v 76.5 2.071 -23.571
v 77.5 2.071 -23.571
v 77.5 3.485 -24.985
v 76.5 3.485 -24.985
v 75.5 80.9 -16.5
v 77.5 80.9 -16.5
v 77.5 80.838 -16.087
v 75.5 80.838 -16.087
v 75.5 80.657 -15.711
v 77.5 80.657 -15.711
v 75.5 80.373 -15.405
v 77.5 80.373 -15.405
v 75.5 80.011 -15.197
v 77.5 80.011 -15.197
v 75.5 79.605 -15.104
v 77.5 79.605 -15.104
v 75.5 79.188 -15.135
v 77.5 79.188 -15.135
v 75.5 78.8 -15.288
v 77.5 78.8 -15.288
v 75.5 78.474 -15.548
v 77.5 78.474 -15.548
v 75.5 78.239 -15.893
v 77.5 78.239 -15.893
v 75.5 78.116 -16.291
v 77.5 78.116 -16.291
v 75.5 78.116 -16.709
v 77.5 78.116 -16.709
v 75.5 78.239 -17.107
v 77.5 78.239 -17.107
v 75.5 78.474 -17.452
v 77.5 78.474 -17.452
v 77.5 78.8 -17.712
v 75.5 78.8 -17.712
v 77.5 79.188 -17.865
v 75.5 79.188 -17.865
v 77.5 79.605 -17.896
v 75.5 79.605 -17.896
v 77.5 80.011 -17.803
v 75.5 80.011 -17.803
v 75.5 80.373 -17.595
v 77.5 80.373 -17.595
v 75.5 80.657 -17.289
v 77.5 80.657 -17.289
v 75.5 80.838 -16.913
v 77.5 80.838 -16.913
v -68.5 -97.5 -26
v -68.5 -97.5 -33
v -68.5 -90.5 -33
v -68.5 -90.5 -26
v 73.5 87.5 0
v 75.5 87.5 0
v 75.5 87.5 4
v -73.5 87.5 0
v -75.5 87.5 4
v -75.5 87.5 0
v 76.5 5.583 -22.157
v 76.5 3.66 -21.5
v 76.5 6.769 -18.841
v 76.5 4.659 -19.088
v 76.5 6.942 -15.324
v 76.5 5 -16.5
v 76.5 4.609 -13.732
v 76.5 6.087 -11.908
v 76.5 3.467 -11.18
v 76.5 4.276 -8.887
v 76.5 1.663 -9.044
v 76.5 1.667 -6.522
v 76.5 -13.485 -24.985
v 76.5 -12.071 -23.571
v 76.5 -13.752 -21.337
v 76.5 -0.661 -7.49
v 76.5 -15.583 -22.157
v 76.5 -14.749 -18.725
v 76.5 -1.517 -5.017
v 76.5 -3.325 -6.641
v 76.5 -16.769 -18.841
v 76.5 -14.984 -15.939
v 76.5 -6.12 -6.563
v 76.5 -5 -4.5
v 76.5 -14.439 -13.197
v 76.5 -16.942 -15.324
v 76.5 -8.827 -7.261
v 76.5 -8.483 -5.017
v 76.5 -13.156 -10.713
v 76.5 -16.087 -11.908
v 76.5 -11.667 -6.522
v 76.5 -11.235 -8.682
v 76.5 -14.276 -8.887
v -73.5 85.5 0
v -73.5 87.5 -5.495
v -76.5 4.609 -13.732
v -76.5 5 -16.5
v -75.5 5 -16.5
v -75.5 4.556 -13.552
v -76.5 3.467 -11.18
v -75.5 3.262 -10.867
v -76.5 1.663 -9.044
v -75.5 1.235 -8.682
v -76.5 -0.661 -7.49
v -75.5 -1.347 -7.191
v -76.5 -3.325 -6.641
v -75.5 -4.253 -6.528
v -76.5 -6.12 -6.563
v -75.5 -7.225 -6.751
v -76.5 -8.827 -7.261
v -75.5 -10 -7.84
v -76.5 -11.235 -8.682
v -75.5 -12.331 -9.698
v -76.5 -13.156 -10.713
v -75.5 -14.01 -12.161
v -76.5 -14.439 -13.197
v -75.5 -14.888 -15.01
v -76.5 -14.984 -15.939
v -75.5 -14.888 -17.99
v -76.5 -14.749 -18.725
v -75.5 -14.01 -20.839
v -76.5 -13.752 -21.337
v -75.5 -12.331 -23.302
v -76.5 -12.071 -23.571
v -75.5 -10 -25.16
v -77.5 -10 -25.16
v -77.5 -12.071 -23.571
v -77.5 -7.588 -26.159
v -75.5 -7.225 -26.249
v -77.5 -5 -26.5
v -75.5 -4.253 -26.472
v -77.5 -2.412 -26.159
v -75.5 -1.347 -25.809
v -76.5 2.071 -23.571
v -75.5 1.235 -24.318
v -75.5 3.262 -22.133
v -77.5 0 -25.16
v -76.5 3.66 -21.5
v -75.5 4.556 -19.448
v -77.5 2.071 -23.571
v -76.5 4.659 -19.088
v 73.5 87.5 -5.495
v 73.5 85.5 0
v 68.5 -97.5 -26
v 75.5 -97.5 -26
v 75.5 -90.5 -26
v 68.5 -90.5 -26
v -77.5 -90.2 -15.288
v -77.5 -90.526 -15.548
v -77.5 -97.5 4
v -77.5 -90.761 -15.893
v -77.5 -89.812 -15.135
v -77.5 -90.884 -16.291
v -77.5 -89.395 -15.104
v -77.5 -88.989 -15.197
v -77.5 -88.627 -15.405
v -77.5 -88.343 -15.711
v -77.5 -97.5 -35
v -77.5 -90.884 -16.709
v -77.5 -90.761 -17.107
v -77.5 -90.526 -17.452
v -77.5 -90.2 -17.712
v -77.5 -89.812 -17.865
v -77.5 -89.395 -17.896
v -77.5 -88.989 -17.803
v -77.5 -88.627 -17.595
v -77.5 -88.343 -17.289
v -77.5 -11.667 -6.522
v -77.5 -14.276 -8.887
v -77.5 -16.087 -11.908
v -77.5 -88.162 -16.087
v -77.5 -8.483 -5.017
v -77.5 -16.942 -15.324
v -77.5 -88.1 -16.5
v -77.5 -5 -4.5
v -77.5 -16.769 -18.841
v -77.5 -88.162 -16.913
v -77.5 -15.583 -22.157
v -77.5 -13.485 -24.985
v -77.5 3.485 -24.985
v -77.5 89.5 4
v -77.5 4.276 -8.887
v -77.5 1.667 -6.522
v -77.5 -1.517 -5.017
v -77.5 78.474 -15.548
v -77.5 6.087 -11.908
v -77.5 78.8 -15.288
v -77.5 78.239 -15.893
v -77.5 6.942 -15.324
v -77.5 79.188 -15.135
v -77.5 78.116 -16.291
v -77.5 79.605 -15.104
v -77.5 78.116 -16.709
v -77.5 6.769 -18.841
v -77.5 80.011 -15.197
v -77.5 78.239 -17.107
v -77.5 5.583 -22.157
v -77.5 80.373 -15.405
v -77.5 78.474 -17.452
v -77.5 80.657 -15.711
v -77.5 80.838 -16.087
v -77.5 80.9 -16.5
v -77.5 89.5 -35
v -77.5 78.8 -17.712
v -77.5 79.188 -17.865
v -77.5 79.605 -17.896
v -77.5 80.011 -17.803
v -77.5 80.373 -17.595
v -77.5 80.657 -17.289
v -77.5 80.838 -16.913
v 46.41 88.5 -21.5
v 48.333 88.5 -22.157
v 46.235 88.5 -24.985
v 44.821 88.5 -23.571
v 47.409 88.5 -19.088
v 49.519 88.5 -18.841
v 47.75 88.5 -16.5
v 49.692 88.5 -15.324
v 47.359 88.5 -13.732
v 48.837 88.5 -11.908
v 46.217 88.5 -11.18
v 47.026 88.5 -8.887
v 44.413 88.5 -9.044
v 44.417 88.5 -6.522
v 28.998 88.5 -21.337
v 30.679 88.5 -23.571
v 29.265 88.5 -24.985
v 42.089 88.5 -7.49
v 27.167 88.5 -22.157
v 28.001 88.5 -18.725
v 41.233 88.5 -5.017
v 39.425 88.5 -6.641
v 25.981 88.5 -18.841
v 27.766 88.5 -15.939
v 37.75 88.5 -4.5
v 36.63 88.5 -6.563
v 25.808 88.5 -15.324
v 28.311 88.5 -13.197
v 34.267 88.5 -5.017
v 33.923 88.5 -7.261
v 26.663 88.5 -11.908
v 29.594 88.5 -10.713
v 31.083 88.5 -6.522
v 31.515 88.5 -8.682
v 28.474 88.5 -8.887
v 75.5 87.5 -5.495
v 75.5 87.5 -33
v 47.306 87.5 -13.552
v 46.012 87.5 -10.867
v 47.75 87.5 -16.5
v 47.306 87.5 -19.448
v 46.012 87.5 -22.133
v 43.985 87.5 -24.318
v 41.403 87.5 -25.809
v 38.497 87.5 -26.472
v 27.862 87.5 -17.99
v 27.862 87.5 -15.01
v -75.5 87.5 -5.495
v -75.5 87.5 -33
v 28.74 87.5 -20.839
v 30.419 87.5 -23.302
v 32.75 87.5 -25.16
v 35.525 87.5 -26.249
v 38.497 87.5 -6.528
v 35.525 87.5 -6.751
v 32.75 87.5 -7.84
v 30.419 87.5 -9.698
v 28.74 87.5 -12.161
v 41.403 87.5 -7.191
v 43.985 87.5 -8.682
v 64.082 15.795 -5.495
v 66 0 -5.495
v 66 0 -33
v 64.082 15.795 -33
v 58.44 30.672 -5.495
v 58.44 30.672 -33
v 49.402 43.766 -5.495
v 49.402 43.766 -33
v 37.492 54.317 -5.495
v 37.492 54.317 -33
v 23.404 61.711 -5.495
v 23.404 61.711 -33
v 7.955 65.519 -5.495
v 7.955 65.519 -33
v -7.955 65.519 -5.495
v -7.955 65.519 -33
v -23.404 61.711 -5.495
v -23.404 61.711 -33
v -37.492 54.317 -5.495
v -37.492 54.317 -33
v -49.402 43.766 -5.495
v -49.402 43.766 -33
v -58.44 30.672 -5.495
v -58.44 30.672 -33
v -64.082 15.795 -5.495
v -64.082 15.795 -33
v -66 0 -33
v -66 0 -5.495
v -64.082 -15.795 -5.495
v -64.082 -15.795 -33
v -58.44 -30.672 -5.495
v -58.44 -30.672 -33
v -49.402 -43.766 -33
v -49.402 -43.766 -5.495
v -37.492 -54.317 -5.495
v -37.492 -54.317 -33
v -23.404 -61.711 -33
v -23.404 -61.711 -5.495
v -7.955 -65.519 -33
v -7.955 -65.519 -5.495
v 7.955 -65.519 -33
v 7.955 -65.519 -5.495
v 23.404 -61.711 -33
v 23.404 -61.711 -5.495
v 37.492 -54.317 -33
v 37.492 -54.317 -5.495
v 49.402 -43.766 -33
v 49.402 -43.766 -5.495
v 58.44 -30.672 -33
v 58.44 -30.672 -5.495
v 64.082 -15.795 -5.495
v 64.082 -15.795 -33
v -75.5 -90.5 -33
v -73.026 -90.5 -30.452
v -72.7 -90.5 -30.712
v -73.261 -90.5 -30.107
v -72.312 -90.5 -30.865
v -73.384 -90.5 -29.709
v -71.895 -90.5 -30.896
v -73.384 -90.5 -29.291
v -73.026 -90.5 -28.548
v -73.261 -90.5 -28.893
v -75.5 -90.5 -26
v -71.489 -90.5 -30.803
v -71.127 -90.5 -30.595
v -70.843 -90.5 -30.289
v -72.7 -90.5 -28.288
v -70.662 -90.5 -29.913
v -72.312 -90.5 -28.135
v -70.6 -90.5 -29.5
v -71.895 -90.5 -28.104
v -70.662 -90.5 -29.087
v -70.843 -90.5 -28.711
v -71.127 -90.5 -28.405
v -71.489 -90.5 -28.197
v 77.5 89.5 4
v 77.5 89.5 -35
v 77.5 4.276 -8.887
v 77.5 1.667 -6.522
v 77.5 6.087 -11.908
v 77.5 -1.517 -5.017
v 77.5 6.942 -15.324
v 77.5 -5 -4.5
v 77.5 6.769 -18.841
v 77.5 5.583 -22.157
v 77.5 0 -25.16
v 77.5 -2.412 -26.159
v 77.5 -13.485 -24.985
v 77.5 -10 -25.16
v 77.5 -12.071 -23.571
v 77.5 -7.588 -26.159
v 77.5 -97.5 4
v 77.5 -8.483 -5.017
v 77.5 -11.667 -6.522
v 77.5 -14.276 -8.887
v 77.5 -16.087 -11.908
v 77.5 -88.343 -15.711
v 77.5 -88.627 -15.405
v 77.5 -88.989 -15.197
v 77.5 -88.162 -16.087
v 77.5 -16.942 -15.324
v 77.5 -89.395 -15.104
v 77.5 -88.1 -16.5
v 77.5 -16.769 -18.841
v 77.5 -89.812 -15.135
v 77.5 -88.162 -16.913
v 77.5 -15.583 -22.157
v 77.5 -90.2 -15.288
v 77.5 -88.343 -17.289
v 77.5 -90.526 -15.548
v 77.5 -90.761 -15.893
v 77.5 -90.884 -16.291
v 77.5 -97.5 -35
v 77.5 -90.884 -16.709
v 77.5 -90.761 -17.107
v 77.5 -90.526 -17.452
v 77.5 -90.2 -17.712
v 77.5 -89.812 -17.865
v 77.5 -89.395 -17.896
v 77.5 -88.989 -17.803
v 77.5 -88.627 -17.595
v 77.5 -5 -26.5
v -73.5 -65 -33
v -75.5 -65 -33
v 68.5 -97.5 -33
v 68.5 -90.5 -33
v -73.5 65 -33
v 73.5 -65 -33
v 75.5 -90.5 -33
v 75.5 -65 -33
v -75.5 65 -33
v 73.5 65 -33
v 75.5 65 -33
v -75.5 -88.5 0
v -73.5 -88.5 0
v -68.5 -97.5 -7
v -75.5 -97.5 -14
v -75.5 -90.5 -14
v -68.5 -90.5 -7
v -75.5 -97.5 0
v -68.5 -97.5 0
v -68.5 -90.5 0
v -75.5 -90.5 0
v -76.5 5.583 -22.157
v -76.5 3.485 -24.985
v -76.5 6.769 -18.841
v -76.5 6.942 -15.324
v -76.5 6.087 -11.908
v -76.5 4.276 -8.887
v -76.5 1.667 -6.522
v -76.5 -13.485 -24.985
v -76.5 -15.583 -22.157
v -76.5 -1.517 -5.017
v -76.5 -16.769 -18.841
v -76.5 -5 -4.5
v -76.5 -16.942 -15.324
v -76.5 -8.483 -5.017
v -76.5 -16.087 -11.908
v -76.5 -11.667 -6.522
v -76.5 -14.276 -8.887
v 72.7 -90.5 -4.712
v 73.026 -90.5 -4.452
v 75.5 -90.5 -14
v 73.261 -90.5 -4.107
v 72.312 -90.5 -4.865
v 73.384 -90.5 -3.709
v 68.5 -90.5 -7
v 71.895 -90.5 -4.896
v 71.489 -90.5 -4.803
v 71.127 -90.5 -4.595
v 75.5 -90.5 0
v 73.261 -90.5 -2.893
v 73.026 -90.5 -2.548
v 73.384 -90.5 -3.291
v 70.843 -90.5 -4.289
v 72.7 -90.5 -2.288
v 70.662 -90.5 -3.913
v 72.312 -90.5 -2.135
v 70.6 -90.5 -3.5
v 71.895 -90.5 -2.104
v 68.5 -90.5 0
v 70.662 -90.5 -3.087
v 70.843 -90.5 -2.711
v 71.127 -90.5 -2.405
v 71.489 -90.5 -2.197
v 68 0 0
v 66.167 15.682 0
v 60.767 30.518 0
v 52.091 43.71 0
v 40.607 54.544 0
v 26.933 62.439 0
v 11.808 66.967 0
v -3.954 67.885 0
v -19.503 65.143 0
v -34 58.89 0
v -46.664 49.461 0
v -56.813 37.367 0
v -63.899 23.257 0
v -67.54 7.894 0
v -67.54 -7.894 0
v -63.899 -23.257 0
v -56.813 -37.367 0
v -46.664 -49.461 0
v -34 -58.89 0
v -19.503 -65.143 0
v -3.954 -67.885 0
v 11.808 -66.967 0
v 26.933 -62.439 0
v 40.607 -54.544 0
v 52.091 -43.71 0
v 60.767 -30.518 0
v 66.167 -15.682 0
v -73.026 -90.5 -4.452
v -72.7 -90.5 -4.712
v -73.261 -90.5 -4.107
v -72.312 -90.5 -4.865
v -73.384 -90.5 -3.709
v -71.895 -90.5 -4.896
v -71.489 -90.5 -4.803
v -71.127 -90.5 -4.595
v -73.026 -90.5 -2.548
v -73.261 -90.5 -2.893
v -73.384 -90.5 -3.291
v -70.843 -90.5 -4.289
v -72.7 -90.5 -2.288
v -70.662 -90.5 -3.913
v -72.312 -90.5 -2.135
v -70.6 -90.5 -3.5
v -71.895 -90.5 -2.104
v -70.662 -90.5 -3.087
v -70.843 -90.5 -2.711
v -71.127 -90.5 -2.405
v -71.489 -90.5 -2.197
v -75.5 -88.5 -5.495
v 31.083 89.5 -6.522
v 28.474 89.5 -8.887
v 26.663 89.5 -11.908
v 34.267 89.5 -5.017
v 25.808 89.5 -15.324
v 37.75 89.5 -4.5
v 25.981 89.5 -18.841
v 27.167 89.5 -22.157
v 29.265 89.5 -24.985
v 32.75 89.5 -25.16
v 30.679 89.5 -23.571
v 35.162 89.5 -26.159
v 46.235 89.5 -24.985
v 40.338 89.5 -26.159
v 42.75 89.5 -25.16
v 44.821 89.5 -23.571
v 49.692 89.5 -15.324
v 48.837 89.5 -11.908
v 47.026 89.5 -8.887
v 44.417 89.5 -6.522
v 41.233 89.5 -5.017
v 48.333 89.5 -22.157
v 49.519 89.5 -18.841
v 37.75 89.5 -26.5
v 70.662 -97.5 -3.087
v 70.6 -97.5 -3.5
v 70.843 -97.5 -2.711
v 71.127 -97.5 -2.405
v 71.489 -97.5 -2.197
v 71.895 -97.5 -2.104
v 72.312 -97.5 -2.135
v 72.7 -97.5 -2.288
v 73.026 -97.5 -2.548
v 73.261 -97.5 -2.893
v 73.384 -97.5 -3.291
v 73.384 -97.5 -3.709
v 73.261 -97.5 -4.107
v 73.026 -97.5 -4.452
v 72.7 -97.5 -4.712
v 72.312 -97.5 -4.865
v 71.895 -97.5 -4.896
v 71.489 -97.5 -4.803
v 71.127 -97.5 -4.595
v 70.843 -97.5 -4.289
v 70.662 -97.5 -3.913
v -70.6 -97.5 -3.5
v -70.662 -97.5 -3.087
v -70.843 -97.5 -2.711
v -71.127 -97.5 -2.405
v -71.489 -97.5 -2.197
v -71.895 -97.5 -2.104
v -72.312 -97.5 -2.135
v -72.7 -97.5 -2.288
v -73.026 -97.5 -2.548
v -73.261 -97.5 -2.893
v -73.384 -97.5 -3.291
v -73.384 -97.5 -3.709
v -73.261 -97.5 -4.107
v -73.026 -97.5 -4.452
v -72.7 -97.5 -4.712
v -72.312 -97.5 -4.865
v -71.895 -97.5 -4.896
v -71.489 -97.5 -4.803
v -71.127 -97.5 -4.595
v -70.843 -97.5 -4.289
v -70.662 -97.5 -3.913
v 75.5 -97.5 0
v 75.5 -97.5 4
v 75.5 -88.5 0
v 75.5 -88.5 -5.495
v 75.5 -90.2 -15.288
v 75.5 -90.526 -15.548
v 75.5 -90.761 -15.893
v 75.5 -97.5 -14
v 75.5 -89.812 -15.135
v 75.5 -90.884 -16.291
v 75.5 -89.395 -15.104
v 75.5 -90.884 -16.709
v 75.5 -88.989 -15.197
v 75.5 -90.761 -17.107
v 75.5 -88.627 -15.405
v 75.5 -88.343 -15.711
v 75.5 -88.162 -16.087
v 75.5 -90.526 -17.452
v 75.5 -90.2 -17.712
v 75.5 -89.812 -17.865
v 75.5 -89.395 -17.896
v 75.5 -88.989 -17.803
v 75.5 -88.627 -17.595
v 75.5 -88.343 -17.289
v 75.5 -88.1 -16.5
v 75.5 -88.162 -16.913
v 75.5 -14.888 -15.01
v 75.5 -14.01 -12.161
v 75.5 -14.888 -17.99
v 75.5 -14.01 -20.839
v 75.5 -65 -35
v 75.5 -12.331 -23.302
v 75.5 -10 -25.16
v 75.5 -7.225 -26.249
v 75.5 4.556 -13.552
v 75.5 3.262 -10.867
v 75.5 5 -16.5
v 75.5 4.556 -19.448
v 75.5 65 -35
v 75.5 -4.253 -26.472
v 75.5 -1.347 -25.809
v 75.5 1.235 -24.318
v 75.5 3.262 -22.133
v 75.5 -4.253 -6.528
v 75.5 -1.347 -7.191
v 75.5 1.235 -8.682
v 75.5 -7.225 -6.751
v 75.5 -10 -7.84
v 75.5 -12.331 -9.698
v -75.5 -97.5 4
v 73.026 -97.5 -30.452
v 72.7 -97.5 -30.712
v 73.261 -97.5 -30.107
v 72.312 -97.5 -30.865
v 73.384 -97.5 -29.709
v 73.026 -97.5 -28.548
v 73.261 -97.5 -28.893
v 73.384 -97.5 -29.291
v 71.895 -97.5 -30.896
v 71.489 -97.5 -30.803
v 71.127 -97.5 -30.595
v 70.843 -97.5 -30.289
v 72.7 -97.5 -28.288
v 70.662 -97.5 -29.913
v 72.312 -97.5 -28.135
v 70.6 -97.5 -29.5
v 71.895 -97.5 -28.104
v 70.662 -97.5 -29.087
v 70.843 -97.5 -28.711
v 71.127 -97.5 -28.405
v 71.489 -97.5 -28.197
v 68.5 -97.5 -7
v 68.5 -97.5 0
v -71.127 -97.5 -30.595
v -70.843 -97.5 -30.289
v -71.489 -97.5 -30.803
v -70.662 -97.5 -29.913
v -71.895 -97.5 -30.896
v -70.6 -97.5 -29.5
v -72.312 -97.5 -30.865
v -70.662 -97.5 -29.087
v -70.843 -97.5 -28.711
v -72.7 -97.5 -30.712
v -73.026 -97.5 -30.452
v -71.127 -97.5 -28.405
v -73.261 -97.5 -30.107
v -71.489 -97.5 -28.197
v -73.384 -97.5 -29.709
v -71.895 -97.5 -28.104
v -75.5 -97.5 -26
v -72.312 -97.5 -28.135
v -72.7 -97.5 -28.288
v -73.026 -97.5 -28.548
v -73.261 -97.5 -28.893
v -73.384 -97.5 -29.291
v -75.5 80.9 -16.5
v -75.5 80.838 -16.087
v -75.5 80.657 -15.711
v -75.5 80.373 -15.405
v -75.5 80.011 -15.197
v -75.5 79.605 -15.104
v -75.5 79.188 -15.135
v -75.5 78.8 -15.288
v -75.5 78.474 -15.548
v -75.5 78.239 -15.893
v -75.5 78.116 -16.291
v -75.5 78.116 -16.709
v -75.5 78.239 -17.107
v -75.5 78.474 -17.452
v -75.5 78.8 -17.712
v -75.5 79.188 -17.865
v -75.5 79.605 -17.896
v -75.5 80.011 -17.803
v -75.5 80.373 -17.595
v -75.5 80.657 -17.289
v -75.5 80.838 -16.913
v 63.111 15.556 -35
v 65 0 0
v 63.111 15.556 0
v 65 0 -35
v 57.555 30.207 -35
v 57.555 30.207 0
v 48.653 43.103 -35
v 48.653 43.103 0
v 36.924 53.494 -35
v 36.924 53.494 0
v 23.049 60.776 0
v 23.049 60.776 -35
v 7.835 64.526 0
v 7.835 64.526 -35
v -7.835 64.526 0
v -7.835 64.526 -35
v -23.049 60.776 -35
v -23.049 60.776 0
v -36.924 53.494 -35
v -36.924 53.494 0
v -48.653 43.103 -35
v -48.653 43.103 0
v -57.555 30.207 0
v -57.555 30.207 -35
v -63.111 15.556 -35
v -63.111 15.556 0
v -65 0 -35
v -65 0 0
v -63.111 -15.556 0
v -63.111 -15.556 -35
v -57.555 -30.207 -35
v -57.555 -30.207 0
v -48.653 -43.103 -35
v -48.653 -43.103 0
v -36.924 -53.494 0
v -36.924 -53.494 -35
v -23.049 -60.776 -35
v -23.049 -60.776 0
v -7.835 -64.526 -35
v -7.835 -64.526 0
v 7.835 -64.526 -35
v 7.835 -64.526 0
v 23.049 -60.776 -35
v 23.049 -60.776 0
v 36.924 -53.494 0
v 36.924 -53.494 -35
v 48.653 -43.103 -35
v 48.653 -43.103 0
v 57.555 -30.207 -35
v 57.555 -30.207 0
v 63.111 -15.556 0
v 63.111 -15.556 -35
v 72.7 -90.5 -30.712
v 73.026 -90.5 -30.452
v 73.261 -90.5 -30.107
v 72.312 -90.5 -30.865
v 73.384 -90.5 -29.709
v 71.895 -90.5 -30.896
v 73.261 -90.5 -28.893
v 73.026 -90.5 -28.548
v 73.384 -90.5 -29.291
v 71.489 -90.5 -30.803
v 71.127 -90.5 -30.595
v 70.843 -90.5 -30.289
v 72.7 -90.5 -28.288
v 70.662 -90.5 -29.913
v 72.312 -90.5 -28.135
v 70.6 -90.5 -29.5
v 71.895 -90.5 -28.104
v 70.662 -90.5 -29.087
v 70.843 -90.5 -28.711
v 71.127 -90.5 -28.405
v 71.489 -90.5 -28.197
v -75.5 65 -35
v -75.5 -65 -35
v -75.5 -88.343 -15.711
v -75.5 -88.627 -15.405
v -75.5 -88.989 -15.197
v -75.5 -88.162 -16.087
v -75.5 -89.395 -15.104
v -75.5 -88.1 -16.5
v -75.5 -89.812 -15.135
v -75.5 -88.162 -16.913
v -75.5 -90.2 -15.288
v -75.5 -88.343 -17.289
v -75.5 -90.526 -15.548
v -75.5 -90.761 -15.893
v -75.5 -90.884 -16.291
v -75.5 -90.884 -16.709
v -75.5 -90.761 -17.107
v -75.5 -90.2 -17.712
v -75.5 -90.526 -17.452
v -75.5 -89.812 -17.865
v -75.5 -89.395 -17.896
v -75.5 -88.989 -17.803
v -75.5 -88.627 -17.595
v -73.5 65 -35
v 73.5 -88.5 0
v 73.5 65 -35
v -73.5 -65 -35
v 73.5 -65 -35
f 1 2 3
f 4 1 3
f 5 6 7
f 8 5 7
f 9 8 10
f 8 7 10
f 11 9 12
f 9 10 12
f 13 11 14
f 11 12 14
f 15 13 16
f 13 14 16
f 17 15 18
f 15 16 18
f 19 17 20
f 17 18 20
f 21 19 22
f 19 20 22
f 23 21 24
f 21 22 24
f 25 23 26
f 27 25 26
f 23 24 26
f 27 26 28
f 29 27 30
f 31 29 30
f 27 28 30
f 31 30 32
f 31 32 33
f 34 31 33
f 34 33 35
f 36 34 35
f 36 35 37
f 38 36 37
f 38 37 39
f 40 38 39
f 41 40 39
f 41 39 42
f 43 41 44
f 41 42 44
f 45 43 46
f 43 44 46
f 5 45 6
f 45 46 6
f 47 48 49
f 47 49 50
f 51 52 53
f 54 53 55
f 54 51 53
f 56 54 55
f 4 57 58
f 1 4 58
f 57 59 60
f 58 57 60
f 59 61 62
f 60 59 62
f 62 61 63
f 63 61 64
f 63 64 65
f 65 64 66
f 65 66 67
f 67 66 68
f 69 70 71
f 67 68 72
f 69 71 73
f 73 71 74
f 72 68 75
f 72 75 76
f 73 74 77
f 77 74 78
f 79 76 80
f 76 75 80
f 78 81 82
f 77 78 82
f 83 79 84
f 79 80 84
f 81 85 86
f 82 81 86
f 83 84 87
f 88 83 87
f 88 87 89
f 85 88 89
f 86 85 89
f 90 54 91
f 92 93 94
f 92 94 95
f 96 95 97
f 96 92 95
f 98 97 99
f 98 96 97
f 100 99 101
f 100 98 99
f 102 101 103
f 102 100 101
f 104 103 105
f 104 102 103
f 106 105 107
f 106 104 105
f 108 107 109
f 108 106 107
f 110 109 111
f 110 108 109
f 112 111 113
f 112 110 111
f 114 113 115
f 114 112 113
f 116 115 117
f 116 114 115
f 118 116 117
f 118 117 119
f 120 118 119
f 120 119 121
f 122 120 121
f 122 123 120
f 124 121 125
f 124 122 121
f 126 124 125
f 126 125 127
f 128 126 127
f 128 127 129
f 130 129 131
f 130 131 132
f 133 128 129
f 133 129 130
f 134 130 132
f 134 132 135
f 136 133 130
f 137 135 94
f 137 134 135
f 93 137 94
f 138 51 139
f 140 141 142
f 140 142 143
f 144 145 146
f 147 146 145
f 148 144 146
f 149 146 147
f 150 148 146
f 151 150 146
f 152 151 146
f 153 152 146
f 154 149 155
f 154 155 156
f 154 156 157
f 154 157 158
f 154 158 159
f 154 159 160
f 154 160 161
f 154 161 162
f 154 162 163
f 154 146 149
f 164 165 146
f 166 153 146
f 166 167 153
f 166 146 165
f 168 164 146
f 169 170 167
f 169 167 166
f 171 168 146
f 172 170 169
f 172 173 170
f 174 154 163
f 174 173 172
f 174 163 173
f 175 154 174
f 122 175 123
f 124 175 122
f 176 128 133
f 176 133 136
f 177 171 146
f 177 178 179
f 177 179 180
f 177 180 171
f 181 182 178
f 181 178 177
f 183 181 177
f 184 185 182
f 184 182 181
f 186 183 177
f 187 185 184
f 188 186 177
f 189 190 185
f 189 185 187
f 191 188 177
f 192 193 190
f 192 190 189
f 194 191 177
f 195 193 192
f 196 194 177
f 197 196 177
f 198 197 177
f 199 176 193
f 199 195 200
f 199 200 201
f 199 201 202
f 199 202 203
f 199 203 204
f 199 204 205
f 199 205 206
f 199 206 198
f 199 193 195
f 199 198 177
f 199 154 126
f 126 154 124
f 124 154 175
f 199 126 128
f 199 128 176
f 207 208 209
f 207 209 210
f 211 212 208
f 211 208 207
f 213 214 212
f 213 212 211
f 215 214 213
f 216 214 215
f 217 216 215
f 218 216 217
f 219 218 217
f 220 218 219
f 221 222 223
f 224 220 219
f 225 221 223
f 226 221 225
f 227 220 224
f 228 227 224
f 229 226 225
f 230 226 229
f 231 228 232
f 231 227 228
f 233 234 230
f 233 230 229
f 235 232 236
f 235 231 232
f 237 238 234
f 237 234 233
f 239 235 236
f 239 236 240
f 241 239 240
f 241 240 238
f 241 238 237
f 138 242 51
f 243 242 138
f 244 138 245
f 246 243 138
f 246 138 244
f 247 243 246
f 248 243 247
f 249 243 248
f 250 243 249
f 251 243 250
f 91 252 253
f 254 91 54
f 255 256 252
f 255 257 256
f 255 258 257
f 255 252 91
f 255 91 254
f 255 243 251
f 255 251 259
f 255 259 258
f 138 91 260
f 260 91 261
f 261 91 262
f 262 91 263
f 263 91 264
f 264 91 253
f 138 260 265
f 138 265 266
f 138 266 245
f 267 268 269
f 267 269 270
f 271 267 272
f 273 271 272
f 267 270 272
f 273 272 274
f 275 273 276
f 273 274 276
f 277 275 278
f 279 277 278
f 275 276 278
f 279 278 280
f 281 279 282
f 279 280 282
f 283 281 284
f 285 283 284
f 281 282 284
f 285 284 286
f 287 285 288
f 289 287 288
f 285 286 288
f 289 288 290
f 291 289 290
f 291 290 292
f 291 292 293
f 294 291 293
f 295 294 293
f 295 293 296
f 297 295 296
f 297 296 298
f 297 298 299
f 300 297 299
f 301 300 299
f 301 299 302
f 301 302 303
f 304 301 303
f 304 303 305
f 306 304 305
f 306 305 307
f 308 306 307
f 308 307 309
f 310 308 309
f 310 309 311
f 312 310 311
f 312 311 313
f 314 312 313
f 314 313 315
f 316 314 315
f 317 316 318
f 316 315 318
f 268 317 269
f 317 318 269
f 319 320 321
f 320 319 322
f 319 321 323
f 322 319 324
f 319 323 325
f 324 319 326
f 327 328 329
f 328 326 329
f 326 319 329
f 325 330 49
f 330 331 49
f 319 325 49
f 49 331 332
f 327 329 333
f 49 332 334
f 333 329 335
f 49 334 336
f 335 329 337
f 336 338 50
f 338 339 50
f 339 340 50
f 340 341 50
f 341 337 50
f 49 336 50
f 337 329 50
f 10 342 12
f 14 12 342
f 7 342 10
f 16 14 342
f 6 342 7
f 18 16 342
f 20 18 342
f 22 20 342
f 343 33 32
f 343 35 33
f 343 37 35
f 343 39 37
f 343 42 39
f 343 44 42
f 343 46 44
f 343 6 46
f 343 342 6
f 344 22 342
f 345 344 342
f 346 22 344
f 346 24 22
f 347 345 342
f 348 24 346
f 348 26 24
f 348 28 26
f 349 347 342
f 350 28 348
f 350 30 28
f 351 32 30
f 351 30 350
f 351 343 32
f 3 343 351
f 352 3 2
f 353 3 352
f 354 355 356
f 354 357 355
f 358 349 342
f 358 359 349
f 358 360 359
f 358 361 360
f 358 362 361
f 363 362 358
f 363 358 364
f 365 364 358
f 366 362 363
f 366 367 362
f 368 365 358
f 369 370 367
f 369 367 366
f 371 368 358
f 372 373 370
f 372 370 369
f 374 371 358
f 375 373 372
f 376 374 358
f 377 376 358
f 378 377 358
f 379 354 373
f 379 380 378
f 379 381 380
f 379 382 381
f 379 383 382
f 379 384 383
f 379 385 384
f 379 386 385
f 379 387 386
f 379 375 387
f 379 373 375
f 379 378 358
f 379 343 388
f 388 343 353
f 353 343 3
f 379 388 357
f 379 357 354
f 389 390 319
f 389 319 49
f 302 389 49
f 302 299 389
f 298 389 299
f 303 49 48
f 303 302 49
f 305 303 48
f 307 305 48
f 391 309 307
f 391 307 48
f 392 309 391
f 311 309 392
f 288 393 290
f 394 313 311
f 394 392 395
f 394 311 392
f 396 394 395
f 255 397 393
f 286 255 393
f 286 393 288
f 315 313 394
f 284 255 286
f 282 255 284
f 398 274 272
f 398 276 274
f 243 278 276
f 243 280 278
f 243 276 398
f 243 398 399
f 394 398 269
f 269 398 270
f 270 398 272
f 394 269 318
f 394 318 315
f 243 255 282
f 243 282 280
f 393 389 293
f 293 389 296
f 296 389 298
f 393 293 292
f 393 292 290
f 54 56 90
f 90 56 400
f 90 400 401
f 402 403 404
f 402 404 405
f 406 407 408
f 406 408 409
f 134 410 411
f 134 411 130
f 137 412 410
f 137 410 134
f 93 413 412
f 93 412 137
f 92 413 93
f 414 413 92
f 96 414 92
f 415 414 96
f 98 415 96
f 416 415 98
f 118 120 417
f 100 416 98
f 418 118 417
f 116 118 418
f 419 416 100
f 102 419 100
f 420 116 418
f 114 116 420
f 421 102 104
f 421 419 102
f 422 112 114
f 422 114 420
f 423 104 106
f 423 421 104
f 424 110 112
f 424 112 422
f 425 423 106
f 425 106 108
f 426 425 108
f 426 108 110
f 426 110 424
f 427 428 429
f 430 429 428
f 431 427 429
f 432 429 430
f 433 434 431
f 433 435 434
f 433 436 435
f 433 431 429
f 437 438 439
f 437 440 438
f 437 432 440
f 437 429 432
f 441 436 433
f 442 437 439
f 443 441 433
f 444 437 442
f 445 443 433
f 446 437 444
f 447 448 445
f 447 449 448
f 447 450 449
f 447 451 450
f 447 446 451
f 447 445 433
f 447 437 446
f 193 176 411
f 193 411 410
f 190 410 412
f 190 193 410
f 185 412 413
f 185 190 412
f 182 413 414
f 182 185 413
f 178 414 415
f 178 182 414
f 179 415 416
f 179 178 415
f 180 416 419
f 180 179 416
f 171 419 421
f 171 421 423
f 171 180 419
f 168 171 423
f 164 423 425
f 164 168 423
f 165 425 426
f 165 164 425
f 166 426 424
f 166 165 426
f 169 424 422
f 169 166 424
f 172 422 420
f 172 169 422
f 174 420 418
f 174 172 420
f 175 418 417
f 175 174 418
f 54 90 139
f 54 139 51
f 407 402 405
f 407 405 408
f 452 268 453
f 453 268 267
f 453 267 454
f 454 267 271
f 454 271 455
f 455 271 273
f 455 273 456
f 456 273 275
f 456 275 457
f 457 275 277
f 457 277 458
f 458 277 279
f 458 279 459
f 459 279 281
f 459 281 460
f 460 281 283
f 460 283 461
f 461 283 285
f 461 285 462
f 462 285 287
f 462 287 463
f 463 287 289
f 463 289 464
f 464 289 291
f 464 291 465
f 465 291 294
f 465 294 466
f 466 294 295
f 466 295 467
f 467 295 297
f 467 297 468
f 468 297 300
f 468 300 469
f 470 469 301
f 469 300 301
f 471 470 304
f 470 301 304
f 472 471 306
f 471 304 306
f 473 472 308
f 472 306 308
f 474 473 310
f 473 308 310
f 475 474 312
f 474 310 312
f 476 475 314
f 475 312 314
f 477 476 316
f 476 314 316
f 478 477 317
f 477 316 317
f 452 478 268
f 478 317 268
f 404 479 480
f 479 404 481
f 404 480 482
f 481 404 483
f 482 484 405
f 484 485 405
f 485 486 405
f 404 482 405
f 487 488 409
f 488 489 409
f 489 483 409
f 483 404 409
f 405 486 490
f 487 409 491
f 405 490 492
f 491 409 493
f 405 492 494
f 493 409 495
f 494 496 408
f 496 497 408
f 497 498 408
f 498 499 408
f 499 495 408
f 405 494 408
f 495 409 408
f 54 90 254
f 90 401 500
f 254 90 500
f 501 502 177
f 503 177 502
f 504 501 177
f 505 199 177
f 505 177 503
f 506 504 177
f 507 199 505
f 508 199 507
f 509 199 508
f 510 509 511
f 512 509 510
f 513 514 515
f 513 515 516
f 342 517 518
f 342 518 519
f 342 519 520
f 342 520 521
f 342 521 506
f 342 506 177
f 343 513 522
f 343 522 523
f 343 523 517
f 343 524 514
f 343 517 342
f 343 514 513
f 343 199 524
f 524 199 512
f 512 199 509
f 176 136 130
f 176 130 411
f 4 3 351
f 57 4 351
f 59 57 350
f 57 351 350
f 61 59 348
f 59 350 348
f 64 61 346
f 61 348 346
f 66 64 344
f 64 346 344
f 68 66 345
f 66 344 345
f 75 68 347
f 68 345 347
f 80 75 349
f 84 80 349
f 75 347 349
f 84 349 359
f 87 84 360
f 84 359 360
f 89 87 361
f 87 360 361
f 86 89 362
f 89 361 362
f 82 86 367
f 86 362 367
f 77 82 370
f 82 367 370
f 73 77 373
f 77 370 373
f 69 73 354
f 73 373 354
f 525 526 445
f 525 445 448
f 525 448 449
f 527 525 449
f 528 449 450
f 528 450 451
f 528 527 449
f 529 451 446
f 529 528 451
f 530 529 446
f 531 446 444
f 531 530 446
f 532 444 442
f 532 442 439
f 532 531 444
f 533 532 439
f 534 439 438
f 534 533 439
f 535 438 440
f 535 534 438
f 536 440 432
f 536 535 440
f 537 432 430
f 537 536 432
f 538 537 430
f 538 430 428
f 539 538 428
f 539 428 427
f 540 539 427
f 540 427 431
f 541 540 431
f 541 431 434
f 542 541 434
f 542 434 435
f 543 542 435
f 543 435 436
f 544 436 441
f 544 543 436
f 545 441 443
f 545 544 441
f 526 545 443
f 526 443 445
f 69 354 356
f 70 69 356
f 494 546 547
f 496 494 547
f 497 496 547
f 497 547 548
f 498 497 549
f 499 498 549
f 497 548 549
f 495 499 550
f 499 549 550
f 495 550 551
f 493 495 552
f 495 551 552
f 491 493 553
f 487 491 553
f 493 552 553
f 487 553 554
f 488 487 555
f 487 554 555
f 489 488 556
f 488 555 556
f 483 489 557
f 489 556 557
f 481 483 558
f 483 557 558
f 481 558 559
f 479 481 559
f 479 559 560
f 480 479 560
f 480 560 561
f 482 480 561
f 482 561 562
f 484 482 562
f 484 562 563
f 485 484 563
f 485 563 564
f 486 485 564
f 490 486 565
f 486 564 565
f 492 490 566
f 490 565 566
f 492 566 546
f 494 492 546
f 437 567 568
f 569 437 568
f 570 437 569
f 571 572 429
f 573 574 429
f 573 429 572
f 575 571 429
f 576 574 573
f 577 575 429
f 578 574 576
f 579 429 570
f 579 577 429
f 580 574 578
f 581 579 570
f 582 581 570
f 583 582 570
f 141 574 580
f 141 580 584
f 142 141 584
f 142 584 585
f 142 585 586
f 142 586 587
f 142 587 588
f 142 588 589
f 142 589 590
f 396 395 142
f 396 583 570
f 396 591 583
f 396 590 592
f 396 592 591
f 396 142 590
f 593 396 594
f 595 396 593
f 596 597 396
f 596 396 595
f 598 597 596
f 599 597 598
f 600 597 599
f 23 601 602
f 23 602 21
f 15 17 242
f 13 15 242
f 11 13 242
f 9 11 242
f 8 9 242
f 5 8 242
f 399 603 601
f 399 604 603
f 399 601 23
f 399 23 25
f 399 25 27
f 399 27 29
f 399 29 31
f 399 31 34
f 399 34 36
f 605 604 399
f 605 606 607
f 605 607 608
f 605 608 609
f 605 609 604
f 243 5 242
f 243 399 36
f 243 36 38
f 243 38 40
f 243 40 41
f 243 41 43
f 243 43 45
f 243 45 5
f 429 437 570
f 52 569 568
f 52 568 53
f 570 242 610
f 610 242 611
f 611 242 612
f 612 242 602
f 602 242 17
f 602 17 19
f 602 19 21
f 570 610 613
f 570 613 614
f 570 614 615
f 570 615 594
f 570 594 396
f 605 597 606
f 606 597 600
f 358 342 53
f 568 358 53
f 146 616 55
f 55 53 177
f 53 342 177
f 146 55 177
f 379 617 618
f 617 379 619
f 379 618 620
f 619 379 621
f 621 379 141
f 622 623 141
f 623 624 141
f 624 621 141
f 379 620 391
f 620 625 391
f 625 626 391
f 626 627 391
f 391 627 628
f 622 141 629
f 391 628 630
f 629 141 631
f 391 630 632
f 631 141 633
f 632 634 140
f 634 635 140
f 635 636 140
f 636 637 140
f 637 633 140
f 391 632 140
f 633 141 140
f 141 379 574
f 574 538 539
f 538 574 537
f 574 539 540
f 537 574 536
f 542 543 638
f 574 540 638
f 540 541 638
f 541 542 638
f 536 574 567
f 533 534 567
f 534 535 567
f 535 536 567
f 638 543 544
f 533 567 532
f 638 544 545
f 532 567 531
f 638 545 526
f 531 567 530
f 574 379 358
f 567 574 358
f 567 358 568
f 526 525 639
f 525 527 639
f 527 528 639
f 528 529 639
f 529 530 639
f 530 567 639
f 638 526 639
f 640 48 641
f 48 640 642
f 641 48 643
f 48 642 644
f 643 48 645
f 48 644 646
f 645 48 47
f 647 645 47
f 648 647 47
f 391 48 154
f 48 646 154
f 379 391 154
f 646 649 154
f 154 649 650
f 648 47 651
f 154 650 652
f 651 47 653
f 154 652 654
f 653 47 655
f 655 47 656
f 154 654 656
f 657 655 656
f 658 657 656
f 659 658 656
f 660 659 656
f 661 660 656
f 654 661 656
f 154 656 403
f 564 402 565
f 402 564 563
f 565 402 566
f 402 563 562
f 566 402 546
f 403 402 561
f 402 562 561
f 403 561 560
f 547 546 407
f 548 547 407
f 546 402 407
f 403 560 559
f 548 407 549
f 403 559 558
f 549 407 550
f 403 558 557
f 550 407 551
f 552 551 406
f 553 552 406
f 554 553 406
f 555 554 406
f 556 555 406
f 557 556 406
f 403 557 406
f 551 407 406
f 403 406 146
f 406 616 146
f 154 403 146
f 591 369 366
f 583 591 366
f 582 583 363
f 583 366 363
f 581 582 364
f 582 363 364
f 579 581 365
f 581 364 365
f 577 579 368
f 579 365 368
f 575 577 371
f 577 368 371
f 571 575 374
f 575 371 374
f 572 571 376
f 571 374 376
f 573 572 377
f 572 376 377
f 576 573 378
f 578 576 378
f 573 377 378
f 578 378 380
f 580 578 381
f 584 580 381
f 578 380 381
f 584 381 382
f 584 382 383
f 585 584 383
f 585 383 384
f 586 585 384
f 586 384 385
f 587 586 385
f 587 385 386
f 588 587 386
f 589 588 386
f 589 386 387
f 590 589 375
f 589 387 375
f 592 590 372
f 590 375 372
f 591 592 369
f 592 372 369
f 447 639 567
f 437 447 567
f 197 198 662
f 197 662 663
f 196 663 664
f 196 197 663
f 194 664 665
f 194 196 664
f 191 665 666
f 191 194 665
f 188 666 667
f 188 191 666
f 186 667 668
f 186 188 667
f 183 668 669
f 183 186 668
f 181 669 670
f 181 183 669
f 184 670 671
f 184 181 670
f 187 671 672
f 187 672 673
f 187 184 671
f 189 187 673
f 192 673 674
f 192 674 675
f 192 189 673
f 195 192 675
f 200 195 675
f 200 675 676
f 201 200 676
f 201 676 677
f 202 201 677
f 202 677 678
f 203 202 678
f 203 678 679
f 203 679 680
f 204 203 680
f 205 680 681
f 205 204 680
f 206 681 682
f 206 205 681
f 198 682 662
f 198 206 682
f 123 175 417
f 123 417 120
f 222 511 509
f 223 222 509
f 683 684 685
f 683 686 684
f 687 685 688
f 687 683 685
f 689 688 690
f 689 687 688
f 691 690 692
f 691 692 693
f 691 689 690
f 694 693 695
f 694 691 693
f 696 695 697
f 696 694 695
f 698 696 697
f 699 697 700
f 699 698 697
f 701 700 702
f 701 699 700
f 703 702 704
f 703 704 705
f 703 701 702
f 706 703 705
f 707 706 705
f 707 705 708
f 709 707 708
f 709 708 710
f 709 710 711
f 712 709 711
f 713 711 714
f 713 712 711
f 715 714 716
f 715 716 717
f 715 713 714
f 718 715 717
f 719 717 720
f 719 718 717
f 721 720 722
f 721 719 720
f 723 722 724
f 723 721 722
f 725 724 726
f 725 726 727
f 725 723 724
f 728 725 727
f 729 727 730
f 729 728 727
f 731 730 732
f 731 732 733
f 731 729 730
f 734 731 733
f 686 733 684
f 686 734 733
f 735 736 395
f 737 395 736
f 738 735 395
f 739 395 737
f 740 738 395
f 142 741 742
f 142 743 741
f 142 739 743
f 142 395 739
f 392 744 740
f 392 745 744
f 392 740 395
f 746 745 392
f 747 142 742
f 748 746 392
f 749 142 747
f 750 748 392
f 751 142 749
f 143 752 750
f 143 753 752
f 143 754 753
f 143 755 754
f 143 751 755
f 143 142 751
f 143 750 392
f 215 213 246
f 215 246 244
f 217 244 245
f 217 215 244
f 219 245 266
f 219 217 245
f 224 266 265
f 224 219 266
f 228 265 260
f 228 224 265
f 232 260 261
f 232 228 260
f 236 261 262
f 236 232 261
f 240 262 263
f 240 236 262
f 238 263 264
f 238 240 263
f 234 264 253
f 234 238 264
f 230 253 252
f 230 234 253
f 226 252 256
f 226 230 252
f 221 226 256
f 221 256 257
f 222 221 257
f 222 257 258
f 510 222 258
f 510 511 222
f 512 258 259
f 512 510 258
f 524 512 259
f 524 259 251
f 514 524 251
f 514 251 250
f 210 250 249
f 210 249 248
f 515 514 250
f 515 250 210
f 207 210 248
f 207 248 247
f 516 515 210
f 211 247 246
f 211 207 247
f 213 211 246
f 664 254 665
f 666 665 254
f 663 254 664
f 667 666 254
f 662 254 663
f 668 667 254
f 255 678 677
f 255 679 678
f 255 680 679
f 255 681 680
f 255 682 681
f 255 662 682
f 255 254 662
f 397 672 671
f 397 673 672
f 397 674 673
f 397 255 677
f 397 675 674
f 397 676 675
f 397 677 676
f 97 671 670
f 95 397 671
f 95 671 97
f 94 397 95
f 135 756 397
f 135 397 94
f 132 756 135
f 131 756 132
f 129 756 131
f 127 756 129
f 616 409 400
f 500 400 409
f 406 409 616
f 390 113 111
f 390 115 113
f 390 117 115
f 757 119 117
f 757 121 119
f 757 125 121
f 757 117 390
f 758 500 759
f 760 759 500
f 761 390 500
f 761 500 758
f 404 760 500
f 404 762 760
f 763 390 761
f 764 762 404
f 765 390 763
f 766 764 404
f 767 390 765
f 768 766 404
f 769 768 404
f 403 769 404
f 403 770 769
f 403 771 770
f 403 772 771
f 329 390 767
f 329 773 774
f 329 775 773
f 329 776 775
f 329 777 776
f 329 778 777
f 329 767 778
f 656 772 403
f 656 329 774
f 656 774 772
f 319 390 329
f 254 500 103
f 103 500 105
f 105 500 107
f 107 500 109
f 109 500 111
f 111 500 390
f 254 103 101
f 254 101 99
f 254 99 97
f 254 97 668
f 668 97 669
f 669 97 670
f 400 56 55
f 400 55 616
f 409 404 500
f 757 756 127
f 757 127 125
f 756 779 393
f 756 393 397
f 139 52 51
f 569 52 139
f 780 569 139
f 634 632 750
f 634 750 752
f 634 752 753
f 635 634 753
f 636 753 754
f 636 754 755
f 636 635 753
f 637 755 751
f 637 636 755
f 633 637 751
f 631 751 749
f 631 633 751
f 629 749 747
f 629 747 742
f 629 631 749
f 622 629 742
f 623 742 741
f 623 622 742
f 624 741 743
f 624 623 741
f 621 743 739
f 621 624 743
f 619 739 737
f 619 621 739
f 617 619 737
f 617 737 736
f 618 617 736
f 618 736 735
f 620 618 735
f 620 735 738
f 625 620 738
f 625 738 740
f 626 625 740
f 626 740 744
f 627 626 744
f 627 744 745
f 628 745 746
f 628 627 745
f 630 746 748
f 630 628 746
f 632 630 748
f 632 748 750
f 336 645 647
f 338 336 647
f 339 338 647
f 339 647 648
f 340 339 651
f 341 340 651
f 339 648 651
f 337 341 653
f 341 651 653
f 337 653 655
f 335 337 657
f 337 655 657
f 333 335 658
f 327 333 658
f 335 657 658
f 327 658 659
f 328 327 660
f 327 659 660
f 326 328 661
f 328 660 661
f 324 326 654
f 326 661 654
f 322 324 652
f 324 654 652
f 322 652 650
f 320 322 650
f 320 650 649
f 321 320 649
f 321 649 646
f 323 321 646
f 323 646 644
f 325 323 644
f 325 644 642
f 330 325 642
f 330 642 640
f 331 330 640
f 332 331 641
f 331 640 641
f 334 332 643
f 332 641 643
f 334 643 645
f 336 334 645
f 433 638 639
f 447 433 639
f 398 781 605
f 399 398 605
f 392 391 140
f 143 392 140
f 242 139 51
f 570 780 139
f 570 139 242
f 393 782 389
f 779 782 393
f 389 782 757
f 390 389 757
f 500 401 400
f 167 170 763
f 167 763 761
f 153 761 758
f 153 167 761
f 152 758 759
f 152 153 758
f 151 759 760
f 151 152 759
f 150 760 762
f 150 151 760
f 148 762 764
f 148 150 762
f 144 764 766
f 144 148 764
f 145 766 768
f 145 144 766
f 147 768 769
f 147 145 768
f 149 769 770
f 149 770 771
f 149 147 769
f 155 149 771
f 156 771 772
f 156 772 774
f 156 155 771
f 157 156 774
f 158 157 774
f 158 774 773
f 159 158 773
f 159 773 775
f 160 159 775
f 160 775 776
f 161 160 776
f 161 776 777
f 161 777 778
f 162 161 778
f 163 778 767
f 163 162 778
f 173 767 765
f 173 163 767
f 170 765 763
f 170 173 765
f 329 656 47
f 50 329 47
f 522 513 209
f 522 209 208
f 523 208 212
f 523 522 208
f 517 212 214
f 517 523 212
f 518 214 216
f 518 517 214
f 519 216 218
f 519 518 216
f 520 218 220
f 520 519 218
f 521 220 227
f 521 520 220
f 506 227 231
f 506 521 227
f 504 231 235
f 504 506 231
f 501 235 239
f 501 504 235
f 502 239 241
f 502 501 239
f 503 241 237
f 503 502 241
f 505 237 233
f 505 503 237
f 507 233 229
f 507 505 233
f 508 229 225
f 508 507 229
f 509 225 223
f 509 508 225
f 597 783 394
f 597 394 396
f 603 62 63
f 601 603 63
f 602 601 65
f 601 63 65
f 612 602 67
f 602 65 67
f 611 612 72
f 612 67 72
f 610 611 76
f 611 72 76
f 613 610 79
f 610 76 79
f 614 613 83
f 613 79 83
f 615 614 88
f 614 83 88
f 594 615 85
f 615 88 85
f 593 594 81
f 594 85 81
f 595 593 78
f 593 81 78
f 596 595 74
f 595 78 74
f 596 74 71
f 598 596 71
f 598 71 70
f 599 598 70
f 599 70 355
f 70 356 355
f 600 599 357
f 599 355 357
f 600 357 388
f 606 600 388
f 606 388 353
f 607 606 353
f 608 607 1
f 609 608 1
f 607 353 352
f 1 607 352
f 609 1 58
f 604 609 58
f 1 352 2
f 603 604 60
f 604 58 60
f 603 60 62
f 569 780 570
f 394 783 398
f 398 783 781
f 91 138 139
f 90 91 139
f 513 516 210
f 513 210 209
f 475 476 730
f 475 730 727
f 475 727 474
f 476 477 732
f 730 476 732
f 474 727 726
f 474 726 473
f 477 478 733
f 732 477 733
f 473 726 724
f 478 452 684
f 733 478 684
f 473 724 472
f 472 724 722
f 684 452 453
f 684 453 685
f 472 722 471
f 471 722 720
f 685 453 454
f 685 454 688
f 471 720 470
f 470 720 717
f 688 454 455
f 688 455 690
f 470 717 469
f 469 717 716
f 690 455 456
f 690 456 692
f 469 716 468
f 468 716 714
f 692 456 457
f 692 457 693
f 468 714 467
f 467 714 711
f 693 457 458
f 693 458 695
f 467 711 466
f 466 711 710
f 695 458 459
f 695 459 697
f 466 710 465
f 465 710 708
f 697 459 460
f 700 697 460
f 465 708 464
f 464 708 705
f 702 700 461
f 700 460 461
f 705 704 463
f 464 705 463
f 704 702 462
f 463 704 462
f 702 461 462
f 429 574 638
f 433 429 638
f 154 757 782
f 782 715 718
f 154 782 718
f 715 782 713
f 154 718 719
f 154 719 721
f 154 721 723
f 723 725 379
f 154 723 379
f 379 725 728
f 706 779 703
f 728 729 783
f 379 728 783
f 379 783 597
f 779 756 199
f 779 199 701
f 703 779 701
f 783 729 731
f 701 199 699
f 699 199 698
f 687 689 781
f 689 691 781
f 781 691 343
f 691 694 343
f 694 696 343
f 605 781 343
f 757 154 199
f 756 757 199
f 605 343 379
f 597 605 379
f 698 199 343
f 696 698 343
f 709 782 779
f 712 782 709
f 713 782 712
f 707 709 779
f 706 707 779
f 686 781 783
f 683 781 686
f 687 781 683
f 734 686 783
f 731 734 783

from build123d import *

# Parameters (mm, degrees)
SKETCH039_W       = 155
SKETCH039_H       = 187
SKETCH039_R       = 65
PAD004_DEPTH      = 2
PAD005_DEPTH      = 37
SKETCH041_R       = 66
SKETCH041_R_2     = 65
PAD006_DEPTH      = 33
PAD007_DEPTH      = 176
PAD012_DEPTH      = 73.5
PAD012_DEPTH_BACK = 73.5
SKETCH054_W       = 2
SKETCH054_H       = 130
POCKET013_DEPTH   = 2
SKETCH067_R       = 10
POCKET015_DEPTH   = 2
SKETCH068_W       = 7
SKETCH068_H       = 7
SKETCH068_R       = 1.4
PAD022_DEPTH      = 7
POCKET017_DEPTH   = 1
POCKET018_DEPTH   = 1
SKETCH074_R       = 10
POCKET019_DEPTH   = 2
SKETCH075_R       = 1.4
POCKET020_DEPTH   = 2


with BuildPart() as part:
    # Sketch039 → Pad004 (new body)
    with BuildSketch(Plane.XY):
        with Locations((0, -4)):
            Rectangle(SKETCH039_W, SKETCH039_H)
        Circle(SKETCH039_R, mode=Mode.SUBTRACT)
    extrude(amount=PAD004_DEPTH)

    # Sketch040 (on DatumPlane) → Pad005 (join)
    with BuildSketch(Plane.XY.offset(2)):
        Polygon((-77.5, 89.5), (77.5, 89.5), (77.5, -97.5), (75.5, -97.5), (75.5, 87.5), (-75.5, 87.5), (-75.5, -97.5), (-77.5, -97.5), align=None)
    extrude(amount=PAD005_DEPTH)

    # Sketch041 (on DatumPlane) → Pad006 (join)
    with BuildSketch(Plane.XY.offset(2)):
        Circle(SKETCH041_R)
        Circle(SKETCH041_R_2, mode=Mode.SUBTRACT)
    extrude(amount=PAD006_DEPTH)

    # Sketch042 (on DatumPlane) → Pad007 (join)
    with BuildSketch(Plane.XZ.offset(88.5)):
        Polygon((75.5, 29.505045), (75.5, 35), (73.5, 35), align=None)
    pad007 = extrude(amount=-PAD007_DEPTH)

    # Mirrored004: Pad007 across YZ
    add(pad007.mirror(Plane.YZ))

    # Sketch047 → Revolution (revolve)
    with BuildSketch(Plane.XZ):
        Polygon((66, 35), (68, 35), (66, 29.505045), align=None)
    revolve(axis=Axis((0, 0, 0), (0, 0, 1)))

    # Sketch048 → Pad012 (join, two sides)
    with BuildSketch(Plane.YZ) as pad012_sk:
        Polygon((87.5, 35), (87.5, 29.505045), (85.5, 35), align=None)
    extrude(amount=PAD012_DEPTH)
    extrude(pad012_sk.sketch, amount=-PAD012_DEPTH_BACK)

    # Sketch054 → Pocket013 (cut)
    with BuildSketch(Plane.XY):
        with Locations((74.5, 0)):
            Rectangle(SKETCH054_W, SKETCH054_H)
    pocket013 = extrude(amount=POCKET013_DEPTH, mode=Mode.SUBTRACT)

    # Mirrored007: Pocket013 across Sketch054 V_Axis
    add(pocket013.mirror(Plane(origin=(0, 0, 0), x_dir=(0, 0, 1), z_dir=(1, 0, 0))), mode=Mode.SUBTRACT)

    # Sketch067 (on DatumPlane) → Pocket015 (cut)
    with BuildSketch(Plane.XZ.offset(-89.5)):
        with Locations((37.75, 18.5)):
            Circle(SKETCH067_R)
    extrude(amount=POCKET015_DEPTH, mode=Mode.SUBTRACT)

    # Sketch068 (on DatumPlane) → Pad022 (join)
    with BuildSketch(Plane.XZ.offset(97.5)):
        with Locations((-72, 5.5)):
            Rectangle(SKETCH068_W, SKETCH068_H)
        with Locations((-72, 5.5)):
            Circle(SKETCH068_R, mode=Mode.SUBTRACT)
        Polygon((-68.5, 28), (-68.5, 35), (-75.5, 35), (-75.5, 21), align=None)
        with Locations((-72, 31.5)):
            Circle(SKETCH068_R, mode=Mode.SUBTRACT)
    pad022 = extrude(amount=-PAD022_DEPTH)

    # Mirrored009: Pad022 across Sketch068 V_Axis
    add(pad022.mirror(Plane(origin=(0, -97.5, 0), x_dir=(0, -1, 0), z_dir=(1, 0, 0))))

    # Sketch070 (on DatumPlane) → Pocket017 (cut)
    with BuildSketch(Plane.XZ.offset(-89.5)):
        with BuildLine():
            ThreePointArc((44.821068, 11.428932), (37.75, 28.5), (30.678932, 11.428932))
            Line((30.678932, 11.428932), (29.264719, 10.014719))
            ThreePointArc((46.235271, 10.014709), (37.750007, 30.5), (29.264719, 10.014719))
            Line((44.821068, 11.428932), (46.235271, 10.014709))
        make_face()
    extrude(amount=POCKET017_DEPTH, mode=Mode.SUBTRACT)

    # Sketch073 (on DatumPlane) → Pocket018 (cut)
    with BuildSketch(Plane.YZ.offset(77.5)):
        with BuildLine():
            ThreePointArc((2.071068, 11.428932), (-5, 28.5), (-12.071068, 11.428932))
            Line((-13.485281, 10.014719), (-12.071068, 11.428932))
            ThreePointArc((3.485291, 10.014728), (-5.000007, 30.5), (-13.485281, 10.014719))
            Line((2.071068, 11.428932), (3.485291, 10.014728))
        make_face()
    pocket018 = extrude(amount=-POCKET018_DEPTH, mode=Mode.SUBTRACT)

    # Sketch074 (on DatumPlane) → Pocket019 (cut)
    with BuildSketch(Plane.YZ.offset(77.5)):
        with Locations((-5, 18.5)):
            Circle(SKETCH074_R)
    pocket019 = extrude(amount=-POCKET019_DEPTH, mode=Mode.SUBTRACT)

    # Mirrored011: Pocket019 across YZ
    add(pocket019.mirror(Plane.YZ), mode=Mode.SUBTRACT)

    # Mirrored012: Pocket018 across YZ
    add(pocket018.mirror(Plane.YZ), mode=Mode.SUBTRACT)

    # Sketch075 (on DatumPlane) → Pocket020 (cut)
    with BuildSketch(Plane.YZ.offset(77.5)):
        with Locations((-89.5, 18.5)):
            Circle(SKETCH075_R)
        with Locations((79.5, 18.5)):
            Circle(SKETCH075_R)
    pocket020 = extrude(amount=-POCKET020_DEPTH, mode=Mode.SUBTRACT)

    # Mirrored013: Pocket020 across YZ
    add(pocket020.mirror(Plane.YZ), mode=Mode.SUBTRACT)


with BuildPart() as part_1:
    # Body004 placement: moved
    add(part.part.moved(Location((0, 0, -35))))


solid = part_1.part
